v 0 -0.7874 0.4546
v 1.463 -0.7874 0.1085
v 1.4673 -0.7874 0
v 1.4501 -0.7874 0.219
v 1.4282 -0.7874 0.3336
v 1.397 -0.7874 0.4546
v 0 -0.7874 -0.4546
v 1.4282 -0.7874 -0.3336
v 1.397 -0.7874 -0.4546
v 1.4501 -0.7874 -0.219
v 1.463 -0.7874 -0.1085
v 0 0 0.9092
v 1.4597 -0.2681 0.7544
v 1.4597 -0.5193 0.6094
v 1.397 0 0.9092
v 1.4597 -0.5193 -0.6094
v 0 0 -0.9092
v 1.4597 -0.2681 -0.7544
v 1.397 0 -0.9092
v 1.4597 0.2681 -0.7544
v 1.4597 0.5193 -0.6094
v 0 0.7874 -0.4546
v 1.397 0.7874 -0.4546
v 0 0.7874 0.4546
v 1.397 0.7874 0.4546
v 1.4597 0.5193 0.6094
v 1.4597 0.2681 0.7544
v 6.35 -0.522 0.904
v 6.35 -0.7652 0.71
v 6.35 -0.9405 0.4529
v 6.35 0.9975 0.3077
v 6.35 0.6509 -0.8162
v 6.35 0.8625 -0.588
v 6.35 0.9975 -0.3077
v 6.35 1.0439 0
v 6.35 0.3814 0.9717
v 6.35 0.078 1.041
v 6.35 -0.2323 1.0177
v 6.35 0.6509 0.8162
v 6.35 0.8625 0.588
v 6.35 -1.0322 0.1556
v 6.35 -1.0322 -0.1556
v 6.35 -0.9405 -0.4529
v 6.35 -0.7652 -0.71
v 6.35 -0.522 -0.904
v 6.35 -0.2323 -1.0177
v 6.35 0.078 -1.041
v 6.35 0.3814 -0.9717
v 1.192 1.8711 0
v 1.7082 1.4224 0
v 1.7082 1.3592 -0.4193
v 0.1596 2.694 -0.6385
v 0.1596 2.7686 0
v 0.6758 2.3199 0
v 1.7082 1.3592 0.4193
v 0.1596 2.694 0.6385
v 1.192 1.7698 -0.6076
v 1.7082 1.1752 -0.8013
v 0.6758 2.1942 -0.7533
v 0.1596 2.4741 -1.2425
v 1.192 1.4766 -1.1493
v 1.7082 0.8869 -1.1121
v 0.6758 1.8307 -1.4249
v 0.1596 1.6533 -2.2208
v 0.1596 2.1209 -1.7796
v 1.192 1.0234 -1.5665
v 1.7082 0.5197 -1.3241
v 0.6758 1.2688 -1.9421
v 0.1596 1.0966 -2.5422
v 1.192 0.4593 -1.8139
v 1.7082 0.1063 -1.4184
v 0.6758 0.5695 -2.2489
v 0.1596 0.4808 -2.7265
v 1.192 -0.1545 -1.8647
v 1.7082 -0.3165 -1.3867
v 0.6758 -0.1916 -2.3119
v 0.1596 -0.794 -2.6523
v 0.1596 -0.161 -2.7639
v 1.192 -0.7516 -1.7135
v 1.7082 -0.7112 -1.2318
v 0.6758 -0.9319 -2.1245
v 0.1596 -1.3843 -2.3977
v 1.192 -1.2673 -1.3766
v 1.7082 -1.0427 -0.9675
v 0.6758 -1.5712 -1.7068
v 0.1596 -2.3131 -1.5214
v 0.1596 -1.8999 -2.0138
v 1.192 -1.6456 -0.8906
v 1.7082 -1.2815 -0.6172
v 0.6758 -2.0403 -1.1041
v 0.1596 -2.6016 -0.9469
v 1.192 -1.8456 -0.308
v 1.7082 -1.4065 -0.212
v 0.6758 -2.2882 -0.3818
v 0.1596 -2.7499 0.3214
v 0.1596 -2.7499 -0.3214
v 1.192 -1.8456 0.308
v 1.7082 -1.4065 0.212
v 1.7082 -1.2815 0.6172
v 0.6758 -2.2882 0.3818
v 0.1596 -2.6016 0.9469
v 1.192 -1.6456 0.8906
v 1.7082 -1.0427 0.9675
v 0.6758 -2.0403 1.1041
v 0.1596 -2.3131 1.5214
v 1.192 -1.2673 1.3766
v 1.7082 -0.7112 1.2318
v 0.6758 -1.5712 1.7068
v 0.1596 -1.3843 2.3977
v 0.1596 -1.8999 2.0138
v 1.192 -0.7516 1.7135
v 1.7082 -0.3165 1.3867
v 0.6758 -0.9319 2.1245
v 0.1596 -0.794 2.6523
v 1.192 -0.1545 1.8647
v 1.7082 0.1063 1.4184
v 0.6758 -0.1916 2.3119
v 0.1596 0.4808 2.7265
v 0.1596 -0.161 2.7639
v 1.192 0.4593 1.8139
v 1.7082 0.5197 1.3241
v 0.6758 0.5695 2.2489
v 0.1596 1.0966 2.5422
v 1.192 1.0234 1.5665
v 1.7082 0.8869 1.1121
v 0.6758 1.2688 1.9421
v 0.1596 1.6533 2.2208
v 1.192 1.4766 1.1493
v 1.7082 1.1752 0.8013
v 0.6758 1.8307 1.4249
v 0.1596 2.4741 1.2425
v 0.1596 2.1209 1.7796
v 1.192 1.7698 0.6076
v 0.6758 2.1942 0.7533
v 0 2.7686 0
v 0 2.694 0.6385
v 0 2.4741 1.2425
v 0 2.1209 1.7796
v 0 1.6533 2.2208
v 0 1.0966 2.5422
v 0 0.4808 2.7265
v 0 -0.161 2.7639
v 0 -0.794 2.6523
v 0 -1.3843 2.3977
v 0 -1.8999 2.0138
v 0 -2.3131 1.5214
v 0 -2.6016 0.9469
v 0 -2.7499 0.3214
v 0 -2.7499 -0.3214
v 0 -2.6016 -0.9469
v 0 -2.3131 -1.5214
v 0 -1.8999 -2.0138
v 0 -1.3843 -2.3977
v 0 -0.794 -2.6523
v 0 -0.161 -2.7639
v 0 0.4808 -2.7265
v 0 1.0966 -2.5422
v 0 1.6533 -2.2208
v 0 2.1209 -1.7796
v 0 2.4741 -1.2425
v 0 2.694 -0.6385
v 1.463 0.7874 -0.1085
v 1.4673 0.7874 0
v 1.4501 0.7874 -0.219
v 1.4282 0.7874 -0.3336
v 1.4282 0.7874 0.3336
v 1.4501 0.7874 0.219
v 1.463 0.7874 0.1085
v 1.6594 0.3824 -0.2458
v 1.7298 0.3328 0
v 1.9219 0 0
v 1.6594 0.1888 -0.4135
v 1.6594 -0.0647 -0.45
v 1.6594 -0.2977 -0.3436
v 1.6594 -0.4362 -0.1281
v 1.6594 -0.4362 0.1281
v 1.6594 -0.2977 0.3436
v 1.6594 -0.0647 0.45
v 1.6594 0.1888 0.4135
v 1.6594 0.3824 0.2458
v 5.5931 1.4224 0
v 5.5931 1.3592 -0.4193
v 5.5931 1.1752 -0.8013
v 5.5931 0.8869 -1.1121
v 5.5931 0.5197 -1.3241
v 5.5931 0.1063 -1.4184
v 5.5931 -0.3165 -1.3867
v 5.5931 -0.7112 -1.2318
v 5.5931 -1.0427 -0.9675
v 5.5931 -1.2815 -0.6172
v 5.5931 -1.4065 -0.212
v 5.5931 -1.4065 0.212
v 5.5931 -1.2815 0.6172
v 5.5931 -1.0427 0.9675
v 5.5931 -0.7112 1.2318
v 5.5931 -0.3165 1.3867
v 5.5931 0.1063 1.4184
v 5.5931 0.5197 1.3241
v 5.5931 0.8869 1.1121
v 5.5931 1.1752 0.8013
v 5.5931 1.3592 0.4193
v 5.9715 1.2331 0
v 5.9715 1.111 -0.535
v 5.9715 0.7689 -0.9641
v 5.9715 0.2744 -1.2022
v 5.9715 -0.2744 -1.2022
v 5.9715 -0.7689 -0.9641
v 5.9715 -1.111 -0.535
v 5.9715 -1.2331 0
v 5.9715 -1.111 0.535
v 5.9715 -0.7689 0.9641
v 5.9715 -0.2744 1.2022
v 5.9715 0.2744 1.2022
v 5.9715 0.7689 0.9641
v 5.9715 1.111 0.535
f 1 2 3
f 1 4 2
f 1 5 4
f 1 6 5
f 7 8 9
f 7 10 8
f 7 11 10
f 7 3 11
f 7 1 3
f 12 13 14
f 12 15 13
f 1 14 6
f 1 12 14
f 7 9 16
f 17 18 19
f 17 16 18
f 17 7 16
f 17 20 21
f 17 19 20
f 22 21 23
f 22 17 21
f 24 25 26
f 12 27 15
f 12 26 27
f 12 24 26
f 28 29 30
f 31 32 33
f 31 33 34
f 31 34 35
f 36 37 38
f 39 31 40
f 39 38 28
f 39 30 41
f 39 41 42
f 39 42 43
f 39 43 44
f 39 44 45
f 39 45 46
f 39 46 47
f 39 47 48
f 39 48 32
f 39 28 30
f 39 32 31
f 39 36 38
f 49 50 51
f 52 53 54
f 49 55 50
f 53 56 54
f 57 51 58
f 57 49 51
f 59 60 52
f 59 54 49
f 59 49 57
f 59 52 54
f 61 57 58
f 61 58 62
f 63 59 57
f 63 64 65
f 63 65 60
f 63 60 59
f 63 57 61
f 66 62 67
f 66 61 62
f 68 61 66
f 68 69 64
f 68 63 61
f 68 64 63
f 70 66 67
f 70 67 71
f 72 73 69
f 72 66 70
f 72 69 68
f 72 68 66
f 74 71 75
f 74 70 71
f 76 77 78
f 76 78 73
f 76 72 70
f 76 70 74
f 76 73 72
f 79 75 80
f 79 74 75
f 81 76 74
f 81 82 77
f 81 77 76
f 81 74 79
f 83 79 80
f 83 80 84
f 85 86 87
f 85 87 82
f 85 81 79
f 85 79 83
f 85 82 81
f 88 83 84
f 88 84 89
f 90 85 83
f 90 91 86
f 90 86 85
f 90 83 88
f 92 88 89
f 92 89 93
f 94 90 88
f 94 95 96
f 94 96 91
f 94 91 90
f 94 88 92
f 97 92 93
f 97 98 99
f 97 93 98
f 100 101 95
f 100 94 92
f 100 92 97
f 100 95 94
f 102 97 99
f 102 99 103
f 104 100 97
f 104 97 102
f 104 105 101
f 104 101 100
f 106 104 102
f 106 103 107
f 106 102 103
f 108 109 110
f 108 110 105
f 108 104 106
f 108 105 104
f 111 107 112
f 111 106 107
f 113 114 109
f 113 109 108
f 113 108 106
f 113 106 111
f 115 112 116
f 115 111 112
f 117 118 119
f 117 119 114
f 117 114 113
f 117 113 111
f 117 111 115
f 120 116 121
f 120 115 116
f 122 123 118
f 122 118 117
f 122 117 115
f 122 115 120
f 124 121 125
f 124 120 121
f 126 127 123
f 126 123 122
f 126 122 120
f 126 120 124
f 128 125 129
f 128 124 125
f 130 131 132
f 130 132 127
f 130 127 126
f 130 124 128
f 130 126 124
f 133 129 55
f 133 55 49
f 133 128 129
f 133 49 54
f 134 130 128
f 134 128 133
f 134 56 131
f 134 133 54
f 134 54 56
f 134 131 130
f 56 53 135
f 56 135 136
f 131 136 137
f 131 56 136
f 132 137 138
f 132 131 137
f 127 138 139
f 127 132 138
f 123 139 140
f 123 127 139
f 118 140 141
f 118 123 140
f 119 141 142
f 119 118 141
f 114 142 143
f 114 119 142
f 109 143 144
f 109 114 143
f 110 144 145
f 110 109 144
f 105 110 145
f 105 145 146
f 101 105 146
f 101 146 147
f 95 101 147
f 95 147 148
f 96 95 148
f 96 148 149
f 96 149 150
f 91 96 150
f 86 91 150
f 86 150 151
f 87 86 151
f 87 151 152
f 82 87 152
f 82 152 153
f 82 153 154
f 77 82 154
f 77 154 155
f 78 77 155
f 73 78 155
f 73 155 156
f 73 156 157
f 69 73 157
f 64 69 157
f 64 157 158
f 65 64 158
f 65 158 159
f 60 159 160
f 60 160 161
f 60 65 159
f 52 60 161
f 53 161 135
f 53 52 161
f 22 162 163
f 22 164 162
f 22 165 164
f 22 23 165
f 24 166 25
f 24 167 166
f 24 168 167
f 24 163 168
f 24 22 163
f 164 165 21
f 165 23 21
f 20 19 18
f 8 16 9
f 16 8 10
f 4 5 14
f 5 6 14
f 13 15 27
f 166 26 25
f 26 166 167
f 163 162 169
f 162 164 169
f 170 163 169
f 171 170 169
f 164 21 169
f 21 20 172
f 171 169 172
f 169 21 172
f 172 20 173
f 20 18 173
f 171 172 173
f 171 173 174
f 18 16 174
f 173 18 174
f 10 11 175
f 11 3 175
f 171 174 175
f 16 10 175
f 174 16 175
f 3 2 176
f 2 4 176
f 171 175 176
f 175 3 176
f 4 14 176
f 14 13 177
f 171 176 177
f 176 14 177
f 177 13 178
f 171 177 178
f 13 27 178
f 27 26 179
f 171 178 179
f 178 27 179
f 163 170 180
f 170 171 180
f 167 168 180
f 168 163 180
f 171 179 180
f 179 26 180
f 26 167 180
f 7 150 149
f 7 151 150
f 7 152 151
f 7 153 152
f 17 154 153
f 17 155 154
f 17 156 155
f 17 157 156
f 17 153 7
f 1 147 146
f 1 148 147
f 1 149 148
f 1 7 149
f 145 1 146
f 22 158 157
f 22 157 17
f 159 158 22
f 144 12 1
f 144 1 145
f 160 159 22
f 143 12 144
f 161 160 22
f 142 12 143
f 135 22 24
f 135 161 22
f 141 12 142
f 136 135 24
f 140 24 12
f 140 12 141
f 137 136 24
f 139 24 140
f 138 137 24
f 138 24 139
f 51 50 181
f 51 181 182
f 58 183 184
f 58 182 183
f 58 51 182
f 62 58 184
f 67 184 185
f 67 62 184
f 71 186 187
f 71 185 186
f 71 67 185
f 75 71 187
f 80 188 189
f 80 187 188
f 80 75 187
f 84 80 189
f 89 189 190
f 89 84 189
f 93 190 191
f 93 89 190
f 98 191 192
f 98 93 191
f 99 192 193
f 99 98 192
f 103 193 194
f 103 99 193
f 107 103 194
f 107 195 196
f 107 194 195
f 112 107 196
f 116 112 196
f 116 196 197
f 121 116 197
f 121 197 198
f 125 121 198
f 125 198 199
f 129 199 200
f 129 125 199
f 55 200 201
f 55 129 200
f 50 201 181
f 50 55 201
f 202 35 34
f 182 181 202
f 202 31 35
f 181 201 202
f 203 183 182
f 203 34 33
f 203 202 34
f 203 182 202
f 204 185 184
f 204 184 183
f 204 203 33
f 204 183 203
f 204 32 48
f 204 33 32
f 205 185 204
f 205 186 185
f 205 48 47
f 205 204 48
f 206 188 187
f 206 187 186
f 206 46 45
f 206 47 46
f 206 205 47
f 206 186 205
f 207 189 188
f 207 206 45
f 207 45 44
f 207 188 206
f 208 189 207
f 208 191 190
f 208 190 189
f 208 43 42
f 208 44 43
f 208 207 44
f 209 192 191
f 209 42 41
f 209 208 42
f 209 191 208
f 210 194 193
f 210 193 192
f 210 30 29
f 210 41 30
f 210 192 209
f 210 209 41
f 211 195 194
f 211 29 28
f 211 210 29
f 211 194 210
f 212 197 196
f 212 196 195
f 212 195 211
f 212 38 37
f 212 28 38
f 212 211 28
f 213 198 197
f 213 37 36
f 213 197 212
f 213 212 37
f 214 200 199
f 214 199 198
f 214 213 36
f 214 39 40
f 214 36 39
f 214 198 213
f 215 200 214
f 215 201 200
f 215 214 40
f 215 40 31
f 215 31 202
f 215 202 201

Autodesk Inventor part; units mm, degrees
ref_plane "YZ Plane" through (0, 0, 0) normal (1, 0, 0) x (0, 1, 0)
ref_plane "XZ Plane" through (0, 0, 0) normal (0, 1, 0) x (-1, 0, 0)
sketch "Skizze1" plane through (0, 0, 0) normal (0, 0, 1) x (1, 0, 0)
  line L0 (6.35, 0) -> (6.35, 1.4224)
  line L1 (6.35, 1.4224) -> (3.6957, 1.4224)
  line L2 (3.6957, 1.4224) -> (2.1082, 1.4224)
  line L3 (0, 2.7686) -> (0, 0.9092)
  line L4 (0, 0.9092) -> (1.397, 0.9092)
  line L5 (1.397, 0.9092) -> (1.9219, 0)
  line L6 (1.9219, 0) -> (6.35, 0)
  line L7 (0, 2.7686) -> (0.1596, 2.7686)
  line L8 (0.1596, 2.7686) -> (1.7082, 1.4224)
  line L9 (2.1082, 1.4224) -> (1.7082, 1.4224)
  line L10 (3.6957, 1.4224) -> (1.7082, 1.4224) construction
  line L11 (1.7082, 1.4224) -> (1.7082, 1.4224)
  line L12 (-1.27, 0) -> (7.62, 0) projected
  line L13 (0, -0.5537) -> (0, 3.3223) projected
  dimension "d0" = 6.35
  dimension "d1" = 2.6543
  dimension "d2" = 1.397
  dimension "d3" = 2.8448
  dimension "d6" = 1.7082
  dimension "d7" = 41
  dimension "d8" = 1.8184
  dimension "d9" = 60
  dimension "d10" = 5.5372
  dimension "d11" = 2.8448
  dimension "d12" = 1.5875
revolve "Körper" add sketch "Skizze1" angle 360 about axis through (1.9219, 0, 0) along (1, 0, 0) contours L6 L5 L4 L3 L7 L8 L9 L2 L1 L0
sketch "Skizze2" plane through (0, 0, 0) normal (-1, 0, 0) x (0, 0, 1)
  circle A0 centre (0, 0) radius 0.9092 projected
  line L0 (0, -3.876) -> (0, 3.876) projected
  line L1 (-3.876, 0) -> (3.876, 0) projected
  line L2 (0.9092, 0) -> (0.4546, -0.7874)
  line L3 (0.4546, -0.7874) -> (-0.4546, -0.7874)
  line L4 (-0.4546, -0.7874) -> (-0.9092, 0)
  line L5 (-0.9092, 0) -> (-0.4546, 0.7874)
  line L6 (-0.4546, 0.7874) -> (0.4546, 0.7874)
  line L7 (0.4546, 0.7874) -> (0.9092, 0)
  point P0 (0, 0.9092)
extrude "Loch" add sketch "Skizze2" against normal up to next contours L7 A0 | A0 L2 | L6 L0 A0 | A0 L0 L3 | L0 L6 A0 | A0 L3 L0 | L4 A0 | A0 L5
thread "Gewinde" size "4-40 UNC" class "2A" standard "ANSI Unified Screw Threads" length 2.6543
chamfer "Fase1" distance 0.3785 distance2 0.7569 1 edges at (6.35, -1.4224, 0) measured on face at (6.35, -0.1427, 0.3949)
ref_plane "Work Plane1" through (104.775, 0, 0) normal (0, 0, -1) x (1, 0, 0)
equation "\"d15\" = GEL"
equation "\"d17\" = -0.5 * SPD + 0.5 * GD"
equation "\"d18\" = GUL"
equation "\"d0\" = NLG"
equation "\"d1\" = GEL"
equation "\"d2\" = INTI"
equation "\"d3\" = GD"
equation "\"d7\" = 0.5 * SEWI"
equation "\"d8\" = 1.1547 * SW"
equation "\"d10\" = KOD"
equation "\"d11\" = BDM"
equation "\"d12\" = GAL"
equation "\"NLG\" = 6.35"
equation "\"INTI\" = 1.397"
equation "\"GEL\" = 2.6543"
equation "\"GAL\" = 1.5875"
equation "\"KOH\" = 2.1082"
equation "\"KOD\" = 5.5372"
equation "\"GUL\" = 0.75692"
equation "\"SPD\" = 2.08788"
equation "\"BDM\" = NND"
equation "\"GD\" = NND"
equation "\"SEWI\" = 82deg"
equation "\"SW\" = 1.5748"
equation "\"TOA\" = 30deg"
equation "\"GD1\" = SPD"
equation "\"THREADDIA\" = 2.8448"
equation "\"HHPTC\" = 0.635"
equation "\"NND\" = 2.8448"
equation "\"E0\" = 1.155 * SW"
properties part number "ANSI B18.3 - 4-40 UNC x 0,25" material "Edelstahl"
